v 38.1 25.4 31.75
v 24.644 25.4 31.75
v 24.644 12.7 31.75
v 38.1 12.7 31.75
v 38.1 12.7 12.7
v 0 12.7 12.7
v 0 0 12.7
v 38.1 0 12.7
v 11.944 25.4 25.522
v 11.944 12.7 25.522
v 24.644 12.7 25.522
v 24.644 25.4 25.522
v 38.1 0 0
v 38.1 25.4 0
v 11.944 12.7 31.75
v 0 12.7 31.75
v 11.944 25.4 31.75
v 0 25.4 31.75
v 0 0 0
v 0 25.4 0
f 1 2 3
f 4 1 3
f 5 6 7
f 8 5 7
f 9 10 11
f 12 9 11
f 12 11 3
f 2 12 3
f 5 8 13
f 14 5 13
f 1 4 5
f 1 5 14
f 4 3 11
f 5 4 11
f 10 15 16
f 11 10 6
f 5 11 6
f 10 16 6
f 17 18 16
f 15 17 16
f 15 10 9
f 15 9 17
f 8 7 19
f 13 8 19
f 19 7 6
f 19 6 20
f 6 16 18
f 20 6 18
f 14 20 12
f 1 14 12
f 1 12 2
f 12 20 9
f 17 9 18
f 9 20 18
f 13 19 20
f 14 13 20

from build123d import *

# Parameters (mm, degrees)
F1_DEPTH = 38.1
F2_W     = 12.7
F2_H     = 6.35
F3_DEPTH = 25.401001


with BuildPart() as f1:
    # F0 (on Right) → F1 (new body)
    with BuildSketch(Plane.YZ):
        Polygon((0, 12.7), (0, 0), (25.400001, 0), (25.400001, 31.75), (12.700001, 31.75), (12.700001, 12.7), align=None)
    extrude(amount=F1_DEPTH)

    # F2 (on Front) → F3 (cut, through all)
    with BuildSketch(Plane.XZ):
        with Locations((18.293744, 28.697193)):
            Rectangle(F2_W, F2_H)
    extrude(amount=-F3_DEPTH, mode=Mode.SUBTRACT)


solid = f1.part
